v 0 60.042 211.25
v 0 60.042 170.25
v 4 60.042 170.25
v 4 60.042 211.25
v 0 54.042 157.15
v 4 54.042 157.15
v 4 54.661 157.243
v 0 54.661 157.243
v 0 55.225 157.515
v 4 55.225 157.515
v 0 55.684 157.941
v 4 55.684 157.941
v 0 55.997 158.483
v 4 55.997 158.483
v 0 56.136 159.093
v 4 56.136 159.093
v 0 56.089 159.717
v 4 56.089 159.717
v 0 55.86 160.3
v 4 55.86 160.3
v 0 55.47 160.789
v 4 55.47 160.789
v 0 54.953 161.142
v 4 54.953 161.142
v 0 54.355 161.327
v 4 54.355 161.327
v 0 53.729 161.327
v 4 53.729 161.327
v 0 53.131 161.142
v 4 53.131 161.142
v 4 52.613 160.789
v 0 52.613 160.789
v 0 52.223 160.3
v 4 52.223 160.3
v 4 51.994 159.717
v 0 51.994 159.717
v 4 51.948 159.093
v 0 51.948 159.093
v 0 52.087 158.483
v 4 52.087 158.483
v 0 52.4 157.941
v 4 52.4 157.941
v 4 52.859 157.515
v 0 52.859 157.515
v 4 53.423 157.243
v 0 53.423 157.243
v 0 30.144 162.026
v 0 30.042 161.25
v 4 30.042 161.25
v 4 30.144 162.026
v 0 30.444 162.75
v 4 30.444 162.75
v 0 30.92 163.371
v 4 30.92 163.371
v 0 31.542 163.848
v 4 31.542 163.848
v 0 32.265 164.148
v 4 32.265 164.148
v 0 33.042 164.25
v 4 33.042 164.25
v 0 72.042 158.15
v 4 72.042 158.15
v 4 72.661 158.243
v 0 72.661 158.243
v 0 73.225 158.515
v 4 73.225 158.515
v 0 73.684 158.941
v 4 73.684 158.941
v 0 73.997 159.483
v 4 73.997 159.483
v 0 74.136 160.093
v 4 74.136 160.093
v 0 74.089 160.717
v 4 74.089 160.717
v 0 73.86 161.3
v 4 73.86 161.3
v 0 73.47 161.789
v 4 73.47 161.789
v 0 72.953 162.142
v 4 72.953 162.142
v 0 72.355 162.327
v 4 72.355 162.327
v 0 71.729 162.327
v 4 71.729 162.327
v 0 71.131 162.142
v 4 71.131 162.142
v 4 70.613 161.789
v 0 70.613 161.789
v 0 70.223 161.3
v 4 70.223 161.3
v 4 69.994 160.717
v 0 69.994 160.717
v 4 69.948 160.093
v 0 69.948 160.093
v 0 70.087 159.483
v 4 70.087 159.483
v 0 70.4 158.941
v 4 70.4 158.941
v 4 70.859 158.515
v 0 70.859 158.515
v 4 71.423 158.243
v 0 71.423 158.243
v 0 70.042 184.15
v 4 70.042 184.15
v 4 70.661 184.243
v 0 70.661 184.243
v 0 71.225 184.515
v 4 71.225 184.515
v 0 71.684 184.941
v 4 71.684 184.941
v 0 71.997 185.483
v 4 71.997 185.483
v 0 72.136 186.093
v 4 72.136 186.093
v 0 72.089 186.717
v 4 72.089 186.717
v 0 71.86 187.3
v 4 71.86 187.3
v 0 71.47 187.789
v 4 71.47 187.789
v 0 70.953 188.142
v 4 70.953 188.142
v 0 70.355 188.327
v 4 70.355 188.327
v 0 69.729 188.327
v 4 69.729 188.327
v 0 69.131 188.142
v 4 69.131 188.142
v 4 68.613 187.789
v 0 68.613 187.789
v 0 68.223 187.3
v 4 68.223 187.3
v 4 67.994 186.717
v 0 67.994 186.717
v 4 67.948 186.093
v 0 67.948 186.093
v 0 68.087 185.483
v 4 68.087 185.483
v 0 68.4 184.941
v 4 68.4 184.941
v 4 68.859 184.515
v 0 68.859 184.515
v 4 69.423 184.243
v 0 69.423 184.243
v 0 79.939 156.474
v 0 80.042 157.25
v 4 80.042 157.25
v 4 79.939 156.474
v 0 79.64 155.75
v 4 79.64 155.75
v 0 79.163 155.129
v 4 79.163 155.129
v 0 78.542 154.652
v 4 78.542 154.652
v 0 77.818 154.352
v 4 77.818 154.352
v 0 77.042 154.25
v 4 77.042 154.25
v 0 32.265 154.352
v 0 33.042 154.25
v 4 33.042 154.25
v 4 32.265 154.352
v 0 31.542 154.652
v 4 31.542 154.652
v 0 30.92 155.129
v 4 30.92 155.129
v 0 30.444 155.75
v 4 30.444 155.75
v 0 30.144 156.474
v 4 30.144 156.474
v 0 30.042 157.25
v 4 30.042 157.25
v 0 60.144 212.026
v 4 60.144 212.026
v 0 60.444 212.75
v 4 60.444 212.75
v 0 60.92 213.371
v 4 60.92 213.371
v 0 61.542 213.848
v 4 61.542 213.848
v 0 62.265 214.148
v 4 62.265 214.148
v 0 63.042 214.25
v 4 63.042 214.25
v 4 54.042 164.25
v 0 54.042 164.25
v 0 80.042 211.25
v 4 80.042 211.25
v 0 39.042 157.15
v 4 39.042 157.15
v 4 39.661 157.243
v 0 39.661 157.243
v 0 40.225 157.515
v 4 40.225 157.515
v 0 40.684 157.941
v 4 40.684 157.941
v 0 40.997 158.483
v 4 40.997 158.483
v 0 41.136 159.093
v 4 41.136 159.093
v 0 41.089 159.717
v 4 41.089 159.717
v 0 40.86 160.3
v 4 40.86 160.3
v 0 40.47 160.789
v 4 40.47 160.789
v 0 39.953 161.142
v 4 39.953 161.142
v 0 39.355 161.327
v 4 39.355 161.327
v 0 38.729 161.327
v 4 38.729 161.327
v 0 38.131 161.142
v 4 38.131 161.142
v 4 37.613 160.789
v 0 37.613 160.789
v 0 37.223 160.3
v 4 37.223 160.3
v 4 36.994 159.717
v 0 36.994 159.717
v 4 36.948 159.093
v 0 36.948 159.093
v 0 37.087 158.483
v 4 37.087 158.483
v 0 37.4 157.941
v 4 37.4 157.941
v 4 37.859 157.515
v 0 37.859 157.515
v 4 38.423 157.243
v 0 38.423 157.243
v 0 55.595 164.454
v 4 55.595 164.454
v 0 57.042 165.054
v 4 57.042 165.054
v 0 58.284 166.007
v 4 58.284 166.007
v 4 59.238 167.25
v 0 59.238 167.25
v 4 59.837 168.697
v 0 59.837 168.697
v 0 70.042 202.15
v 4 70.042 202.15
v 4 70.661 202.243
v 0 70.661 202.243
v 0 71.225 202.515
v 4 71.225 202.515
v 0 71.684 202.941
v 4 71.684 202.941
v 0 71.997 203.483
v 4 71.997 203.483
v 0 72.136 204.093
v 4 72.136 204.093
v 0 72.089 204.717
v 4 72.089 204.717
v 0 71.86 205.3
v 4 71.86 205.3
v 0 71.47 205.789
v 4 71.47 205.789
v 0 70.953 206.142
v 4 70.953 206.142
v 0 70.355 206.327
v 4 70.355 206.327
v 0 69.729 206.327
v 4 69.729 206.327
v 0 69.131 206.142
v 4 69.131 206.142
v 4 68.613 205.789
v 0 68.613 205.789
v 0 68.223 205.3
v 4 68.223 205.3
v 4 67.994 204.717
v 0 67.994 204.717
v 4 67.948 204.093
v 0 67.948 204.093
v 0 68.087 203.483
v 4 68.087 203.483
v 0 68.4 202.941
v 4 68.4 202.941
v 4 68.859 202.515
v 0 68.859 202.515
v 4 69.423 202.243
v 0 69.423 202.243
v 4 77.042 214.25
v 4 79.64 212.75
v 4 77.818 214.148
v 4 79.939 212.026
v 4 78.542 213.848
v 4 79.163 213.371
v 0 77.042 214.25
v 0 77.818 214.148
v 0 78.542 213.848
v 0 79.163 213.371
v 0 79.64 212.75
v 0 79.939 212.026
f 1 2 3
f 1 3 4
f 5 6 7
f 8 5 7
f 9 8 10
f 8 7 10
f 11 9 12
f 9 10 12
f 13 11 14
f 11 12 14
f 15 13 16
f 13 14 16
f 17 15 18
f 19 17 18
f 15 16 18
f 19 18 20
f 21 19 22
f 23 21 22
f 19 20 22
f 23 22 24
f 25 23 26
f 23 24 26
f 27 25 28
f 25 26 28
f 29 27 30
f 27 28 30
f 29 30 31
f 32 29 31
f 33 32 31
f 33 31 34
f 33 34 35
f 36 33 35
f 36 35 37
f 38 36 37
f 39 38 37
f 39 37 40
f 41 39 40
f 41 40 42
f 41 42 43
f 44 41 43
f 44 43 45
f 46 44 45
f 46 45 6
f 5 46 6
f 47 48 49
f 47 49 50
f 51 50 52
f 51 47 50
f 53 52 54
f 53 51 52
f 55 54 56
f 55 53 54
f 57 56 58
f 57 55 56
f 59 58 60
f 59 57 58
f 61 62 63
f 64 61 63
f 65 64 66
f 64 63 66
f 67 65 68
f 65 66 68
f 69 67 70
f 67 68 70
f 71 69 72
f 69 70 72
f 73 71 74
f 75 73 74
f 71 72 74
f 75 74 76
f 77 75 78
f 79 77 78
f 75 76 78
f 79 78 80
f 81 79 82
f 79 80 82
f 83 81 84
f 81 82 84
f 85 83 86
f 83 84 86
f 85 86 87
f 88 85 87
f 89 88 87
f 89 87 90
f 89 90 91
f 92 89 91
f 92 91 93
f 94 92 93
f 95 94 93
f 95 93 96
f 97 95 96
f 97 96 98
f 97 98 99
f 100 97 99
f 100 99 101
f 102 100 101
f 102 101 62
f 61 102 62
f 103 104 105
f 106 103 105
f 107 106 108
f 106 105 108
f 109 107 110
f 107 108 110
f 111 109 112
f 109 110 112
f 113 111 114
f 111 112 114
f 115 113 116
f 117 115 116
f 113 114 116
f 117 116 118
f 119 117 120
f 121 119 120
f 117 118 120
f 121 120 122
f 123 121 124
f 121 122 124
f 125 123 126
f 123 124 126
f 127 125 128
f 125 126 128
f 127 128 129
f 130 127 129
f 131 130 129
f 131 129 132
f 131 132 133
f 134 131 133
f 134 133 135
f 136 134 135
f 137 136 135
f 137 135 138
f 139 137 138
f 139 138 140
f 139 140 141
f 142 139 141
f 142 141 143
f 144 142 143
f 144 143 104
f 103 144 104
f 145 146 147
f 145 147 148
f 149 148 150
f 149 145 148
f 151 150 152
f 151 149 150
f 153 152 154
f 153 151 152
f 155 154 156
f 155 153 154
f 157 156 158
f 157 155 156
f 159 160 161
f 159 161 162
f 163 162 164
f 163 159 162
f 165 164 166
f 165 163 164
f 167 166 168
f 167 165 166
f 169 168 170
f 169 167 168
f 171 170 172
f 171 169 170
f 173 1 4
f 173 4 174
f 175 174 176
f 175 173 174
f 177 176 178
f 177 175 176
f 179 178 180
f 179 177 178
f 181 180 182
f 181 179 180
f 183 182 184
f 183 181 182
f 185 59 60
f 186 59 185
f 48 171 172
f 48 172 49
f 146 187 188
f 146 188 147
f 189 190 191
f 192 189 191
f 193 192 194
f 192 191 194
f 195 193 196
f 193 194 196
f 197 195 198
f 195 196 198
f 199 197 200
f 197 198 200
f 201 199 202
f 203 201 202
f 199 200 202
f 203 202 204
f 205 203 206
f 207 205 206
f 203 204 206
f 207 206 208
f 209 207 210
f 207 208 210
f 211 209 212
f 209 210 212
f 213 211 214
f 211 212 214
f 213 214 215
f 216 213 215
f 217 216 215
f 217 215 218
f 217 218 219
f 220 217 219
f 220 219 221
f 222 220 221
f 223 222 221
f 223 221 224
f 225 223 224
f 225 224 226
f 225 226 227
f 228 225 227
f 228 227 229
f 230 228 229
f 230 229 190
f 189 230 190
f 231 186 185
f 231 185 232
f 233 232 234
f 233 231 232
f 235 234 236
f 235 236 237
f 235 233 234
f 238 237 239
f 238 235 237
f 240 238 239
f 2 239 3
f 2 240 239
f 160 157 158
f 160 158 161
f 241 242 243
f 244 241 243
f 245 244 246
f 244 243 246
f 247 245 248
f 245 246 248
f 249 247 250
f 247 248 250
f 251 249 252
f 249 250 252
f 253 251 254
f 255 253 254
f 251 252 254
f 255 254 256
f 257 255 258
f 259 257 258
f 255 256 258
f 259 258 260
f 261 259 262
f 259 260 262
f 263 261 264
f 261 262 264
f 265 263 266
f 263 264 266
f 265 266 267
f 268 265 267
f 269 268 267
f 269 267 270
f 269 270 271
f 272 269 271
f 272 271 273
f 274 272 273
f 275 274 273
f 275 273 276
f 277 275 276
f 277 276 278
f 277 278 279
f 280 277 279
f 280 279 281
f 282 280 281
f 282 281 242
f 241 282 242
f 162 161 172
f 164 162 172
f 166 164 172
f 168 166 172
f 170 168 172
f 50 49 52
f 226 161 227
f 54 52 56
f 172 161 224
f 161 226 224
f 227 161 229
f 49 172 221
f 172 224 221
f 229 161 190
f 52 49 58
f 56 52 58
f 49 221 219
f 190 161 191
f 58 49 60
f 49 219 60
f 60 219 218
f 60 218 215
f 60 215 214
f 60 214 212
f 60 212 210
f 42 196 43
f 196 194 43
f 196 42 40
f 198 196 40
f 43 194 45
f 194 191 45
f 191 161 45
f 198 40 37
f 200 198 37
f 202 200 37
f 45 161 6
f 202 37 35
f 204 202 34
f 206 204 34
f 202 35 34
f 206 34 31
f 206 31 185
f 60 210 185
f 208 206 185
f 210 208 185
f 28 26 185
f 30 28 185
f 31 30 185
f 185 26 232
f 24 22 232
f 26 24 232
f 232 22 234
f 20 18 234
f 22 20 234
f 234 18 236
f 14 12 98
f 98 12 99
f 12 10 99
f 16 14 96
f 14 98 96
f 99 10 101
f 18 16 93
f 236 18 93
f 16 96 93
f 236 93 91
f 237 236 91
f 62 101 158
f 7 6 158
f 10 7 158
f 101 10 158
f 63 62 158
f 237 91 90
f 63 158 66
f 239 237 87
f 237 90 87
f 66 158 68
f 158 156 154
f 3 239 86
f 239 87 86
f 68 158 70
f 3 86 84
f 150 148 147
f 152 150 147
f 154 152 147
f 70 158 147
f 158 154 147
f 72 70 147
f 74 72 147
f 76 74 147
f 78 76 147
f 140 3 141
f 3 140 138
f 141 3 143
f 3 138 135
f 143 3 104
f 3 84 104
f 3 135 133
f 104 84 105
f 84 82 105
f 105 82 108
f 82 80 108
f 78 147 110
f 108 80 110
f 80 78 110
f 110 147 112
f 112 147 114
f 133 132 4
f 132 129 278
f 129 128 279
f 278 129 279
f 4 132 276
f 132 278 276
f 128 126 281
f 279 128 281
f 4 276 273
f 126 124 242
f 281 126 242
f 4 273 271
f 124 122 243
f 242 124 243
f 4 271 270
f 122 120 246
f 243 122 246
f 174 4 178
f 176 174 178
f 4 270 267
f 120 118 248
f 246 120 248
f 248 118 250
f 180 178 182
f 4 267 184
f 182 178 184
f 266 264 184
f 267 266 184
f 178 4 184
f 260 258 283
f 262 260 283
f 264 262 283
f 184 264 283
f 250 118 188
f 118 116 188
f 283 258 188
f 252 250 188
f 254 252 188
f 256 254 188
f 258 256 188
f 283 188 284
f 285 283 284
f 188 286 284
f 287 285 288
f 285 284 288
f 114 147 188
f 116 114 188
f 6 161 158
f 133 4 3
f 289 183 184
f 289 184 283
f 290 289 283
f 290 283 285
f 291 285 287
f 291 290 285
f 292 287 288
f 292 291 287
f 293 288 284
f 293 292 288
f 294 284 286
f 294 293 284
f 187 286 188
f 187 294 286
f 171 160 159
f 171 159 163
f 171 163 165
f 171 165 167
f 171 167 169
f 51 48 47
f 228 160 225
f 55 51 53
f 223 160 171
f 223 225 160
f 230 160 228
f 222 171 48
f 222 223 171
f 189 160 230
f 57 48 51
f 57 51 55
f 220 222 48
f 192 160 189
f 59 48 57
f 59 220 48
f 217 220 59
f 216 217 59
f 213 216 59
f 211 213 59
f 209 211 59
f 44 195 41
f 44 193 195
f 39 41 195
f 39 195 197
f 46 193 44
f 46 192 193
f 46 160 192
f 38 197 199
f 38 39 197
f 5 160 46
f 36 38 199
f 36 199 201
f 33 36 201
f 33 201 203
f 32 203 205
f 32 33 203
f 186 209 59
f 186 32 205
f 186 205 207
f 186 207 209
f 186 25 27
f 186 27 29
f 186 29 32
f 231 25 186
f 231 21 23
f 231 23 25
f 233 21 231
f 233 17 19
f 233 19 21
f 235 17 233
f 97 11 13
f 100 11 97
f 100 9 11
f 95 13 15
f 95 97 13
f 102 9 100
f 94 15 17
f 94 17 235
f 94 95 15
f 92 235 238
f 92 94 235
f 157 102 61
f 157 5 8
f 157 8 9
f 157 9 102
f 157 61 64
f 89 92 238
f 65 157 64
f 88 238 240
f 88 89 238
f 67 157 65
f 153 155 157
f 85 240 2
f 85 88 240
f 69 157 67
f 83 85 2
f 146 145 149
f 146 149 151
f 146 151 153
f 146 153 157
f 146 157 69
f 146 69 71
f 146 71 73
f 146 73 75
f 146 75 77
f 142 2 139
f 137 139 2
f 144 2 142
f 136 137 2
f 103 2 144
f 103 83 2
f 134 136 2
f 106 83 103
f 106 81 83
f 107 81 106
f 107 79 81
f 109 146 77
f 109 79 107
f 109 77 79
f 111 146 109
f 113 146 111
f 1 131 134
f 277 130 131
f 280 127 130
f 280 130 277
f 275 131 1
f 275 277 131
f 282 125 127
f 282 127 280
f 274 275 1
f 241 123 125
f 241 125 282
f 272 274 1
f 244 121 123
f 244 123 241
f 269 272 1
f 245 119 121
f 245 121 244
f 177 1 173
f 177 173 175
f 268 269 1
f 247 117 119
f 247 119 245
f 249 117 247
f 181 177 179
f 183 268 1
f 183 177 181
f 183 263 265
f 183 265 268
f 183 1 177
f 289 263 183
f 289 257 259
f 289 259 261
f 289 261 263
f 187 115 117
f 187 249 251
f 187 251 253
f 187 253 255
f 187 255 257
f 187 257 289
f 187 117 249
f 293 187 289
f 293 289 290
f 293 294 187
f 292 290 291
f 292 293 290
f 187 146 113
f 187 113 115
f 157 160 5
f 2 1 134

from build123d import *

# Parameters (mm, degrees)
EXTRUDE_1_DEPTH     = 4
SKETCH_3_R          = 2.1
CUT_EXTRUDE_1_DEPTH = 10


with BuildPart() as part:
    # 草图2 → 凸台-拉伸1 (new body)
    with BuildSketch(Plane(origin=(0, 0, 0), x_dir=(0, 0, -1), z_dir=(1, 0, 0))):
        with BuildLine():
            Line((-211.25, 80.041666667), (-157.25, 80.041666667))
            ThreePointArc((-157.25, 80.041666667), (-155.128679656, 79.16298701), (-154.25, 77.041666667))
            Line((-154.25, 77.041666667), (-154.25, 33.041666667))
            ThreePointArc((-154.25, 33.041666667), (-155.128679656, 30.920346323), (-157.25, 30.041666667))
            Line((-157.25, 30.041666667), (-161.25, 30.041666667))
            ThreePointArc((-161.25, 30.041666667), (-163.371320344, 30.920346323), (-164.25, 33.041666667))
            Line((-164.25, 33.041666667), (-164.25, 54.041666667))
            ThreePointArc((-164.25, 54.041666667), (-166.007359313, 58.284307354), (-170.25, 60.041666667))
            Line((-170.25, 60.041666667), (-211.25, 60.041666667))
            ThreePointArc((-211.25, 60.041666667), (-213.371320344, 60.920346323), (-214.25, 63.041666667))
            Line((-214.25, 63.041666667), (-214.25, 77.041666667))
            ThreePointArc((-214.25, 77.041666667), (-213.371320344, 79.16298701), (-211.25, 80.041666667))
        make_face()
    extrude(amount=EXTRUDE_1_DEPTH)

    # 草图3 → 切除-拉伸1 (cut)
    with BuildSketch(Plane(origin=(4, 0, 0), x_dir=(0, 0, -1), z_dir=(1, 0, 0))):
        with Locations((-204.25, 70.041666667)):
            Circle(SKETCH_3_R)
        with Locations((-186.25, 70.041666667)):
            Circle(SKETCH_3_R)
        with Locations((-159.25, 54.041666667)):
            Circle(SKETCH_3_R)
        with Locations((-159.25, 39.041666667)):
            Circle(SKETCH_3_R)
        with Locations((-160.25, 72.041666667)):
            Circle(SKETCH_3_R)
    extrude(amount=-CUT_EXTRUDE_1_DEPTH, mode=Mode.SUBTRACT)


solid = part.part
